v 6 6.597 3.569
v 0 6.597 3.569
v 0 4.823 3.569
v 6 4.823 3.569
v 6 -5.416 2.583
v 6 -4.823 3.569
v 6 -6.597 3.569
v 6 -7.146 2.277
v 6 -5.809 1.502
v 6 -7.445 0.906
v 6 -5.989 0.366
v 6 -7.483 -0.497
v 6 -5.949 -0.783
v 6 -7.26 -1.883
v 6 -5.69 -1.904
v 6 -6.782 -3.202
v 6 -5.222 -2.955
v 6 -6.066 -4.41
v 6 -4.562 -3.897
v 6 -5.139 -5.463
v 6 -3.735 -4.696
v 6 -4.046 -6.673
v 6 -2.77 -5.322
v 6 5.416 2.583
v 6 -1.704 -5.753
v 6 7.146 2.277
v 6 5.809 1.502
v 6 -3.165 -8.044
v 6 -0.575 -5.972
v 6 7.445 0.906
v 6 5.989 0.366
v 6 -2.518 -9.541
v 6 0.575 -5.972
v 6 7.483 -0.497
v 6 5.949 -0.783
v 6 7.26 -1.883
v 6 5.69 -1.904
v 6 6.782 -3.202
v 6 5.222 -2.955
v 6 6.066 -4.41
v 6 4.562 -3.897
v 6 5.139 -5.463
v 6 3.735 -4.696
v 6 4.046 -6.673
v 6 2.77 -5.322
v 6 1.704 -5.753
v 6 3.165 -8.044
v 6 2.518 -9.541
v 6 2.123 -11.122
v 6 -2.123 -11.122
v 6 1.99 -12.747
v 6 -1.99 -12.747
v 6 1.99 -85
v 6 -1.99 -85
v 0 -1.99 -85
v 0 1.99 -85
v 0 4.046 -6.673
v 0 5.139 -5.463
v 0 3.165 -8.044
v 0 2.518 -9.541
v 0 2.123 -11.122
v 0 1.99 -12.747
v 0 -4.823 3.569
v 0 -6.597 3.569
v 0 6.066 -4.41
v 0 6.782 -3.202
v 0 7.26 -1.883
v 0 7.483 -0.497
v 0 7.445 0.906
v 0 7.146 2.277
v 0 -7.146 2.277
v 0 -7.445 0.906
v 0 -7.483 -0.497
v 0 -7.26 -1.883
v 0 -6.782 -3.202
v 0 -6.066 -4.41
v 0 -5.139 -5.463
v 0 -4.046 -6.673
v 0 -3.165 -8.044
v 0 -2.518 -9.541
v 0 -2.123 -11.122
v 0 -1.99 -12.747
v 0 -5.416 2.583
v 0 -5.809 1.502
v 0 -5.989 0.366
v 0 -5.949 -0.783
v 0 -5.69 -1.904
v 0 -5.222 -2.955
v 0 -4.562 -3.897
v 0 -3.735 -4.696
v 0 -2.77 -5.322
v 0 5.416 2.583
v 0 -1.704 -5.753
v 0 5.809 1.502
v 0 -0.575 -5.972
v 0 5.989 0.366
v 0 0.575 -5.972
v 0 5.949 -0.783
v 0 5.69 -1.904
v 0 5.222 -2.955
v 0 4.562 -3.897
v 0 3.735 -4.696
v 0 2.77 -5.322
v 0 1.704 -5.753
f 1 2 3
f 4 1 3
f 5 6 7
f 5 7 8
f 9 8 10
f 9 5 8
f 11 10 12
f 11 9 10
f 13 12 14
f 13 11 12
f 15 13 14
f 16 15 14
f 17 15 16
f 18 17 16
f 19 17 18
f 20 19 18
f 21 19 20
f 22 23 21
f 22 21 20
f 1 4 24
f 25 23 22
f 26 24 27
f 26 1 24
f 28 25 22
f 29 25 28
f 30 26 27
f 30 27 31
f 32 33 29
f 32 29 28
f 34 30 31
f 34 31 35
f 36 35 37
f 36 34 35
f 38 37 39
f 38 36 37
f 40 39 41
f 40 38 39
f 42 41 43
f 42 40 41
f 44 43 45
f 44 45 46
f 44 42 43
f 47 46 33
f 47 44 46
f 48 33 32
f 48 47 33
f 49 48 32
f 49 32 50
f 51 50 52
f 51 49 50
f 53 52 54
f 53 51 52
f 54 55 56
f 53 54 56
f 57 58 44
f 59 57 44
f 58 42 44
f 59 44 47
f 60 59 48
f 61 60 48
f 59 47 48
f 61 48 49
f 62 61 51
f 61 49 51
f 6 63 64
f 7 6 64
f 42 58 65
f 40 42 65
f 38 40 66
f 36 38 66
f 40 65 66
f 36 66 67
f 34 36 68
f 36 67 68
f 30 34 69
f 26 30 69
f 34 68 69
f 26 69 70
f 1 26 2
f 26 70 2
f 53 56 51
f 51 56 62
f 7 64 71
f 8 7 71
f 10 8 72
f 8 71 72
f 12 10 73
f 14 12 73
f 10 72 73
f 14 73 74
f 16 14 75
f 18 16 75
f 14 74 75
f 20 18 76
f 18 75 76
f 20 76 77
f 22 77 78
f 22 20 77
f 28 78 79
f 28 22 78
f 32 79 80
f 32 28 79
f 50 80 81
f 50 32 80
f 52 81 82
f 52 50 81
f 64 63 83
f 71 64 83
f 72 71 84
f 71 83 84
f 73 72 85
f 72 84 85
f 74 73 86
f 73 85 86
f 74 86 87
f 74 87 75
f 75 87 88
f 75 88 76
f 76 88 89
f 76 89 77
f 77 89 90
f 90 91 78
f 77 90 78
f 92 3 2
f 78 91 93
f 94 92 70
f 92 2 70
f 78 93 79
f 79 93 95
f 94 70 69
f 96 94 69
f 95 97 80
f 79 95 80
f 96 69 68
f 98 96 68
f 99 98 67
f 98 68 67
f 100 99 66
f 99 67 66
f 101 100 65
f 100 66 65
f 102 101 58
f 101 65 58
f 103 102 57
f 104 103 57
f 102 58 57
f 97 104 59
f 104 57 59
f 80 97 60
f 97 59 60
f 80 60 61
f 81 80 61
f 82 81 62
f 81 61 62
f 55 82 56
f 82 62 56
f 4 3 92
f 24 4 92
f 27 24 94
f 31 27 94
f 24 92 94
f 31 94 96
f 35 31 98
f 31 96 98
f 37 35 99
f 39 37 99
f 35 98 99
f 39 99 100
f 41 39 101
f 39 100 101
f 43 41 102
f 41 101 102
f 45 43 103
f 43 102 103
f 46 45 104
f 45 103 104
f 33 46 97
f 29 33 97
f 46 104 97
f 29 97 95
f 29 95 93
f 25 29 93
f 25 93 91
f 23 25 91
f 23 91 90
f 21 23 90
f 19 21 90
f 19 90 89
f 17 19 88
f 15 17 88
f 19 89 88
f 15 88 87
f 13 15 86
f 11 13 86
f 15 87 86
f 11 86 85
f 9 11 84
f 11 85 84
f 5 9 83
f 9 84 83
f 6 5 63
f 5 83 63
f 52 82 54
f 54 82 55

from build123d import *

# Parameters (mm, degrees)
BOSS_EXTRUDE1_DEPTH = 6
FILLET1_R           = 10


with BuildPart() as part:
    # Sketch1 → Boss-Extrude1 (new body)
    with BuildSketch(Plane(origin=(0, 0, 0), x_dir=(0, 0, -1), z_dir=(1, 0, 0))):
        with BuildLine():
            ThreePointArc((7.23115504, 1.990074568), (2.942582115, 6.898638307), (-3.56853515, 6.596632238))
            Line((-3.56853515, 6.596632238), (-3.56853515, 4.823438285))
            ThreePointArc((-3.56853515, 4.823438285), (6, 0), (-3.56853515, -4.823438285))
            Line((-3.56853515, -4.823438285), (-3.56853515, -6.596632238))
            ThreePointArc((-3.56853515, -6.596632238), (2.942582115, -6.898638307), (7.23115504, -1.990074568))
            Line((7.23115504, -1.990074568), (85, -1.990074568))
            Line((85, -1.990074568), (85, 1.990074568))
            Line((85, 1.990074568), (7.23115504, 1.990074568))
        make_face()
    extrude(amount=BOSS_EXTRUDE1_DEPTH)

    # Fillet1
    fillet1_edges = [part.edges().sort_by_distance(p)[0] for p in [
        (3, 1.990074568, -7.23115504),
        (3, -1.990074568, -7.23115504),
    ]]
    fillet(fillet1_edges, radius=FILLET1_R)


solid = part.part
